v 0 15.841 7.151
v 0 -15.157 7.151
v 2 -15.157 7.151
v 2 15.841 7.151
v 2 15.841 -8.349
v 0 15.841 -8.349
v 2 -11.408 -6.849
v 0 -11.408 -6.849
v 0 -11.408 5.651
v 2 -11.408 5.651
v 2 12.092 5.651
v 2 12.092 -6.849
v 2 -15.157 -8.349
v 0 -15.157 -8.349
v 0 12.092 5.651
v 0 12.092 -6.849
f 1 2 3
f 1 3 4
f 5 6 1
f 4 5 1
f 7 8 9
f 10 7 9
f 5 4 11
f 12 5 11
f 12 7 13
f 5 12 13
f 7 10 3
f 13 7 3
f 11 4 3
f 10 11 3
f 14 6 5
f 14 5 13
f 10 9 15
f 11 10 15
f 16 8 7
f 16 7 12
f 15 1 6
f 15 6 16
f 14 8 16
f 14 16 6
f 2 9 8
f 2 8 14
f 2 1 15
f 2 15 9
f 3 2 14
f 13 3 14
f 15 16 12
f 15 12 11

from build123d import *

# Parameters (mm, degrees)
SKETCH1_W           = 23.5
SKETCH1_H           = 12.5
BOSS_EXTRUDE1_DEPTH = 2


with BuildPart() as part:
    # Sketch1 → Boss-Extrude1 (new body)
    with BuildSketch(Plane.YZ):
        Polygon((15.84119162, -7.151864849), (15.84119162, -8.348913545), (-15.15732803, -8.348913545), (-15.15732803, -6.848913545), (-15.15732803, 5.651086455), (-15.15732803, 7.151086455), (15.84119162, 7.151086455), (15.84119162, 6.848135151), align=None)
        with Locations((0.341931795, -0.598913545)):
            Rectangle(SKETCH1_W, SKETCH1_H, mode=Mode.SUBTRACT)
    extrude(amount=BOSS_EXTRUDE1_DEPTH)


solid = part.part
